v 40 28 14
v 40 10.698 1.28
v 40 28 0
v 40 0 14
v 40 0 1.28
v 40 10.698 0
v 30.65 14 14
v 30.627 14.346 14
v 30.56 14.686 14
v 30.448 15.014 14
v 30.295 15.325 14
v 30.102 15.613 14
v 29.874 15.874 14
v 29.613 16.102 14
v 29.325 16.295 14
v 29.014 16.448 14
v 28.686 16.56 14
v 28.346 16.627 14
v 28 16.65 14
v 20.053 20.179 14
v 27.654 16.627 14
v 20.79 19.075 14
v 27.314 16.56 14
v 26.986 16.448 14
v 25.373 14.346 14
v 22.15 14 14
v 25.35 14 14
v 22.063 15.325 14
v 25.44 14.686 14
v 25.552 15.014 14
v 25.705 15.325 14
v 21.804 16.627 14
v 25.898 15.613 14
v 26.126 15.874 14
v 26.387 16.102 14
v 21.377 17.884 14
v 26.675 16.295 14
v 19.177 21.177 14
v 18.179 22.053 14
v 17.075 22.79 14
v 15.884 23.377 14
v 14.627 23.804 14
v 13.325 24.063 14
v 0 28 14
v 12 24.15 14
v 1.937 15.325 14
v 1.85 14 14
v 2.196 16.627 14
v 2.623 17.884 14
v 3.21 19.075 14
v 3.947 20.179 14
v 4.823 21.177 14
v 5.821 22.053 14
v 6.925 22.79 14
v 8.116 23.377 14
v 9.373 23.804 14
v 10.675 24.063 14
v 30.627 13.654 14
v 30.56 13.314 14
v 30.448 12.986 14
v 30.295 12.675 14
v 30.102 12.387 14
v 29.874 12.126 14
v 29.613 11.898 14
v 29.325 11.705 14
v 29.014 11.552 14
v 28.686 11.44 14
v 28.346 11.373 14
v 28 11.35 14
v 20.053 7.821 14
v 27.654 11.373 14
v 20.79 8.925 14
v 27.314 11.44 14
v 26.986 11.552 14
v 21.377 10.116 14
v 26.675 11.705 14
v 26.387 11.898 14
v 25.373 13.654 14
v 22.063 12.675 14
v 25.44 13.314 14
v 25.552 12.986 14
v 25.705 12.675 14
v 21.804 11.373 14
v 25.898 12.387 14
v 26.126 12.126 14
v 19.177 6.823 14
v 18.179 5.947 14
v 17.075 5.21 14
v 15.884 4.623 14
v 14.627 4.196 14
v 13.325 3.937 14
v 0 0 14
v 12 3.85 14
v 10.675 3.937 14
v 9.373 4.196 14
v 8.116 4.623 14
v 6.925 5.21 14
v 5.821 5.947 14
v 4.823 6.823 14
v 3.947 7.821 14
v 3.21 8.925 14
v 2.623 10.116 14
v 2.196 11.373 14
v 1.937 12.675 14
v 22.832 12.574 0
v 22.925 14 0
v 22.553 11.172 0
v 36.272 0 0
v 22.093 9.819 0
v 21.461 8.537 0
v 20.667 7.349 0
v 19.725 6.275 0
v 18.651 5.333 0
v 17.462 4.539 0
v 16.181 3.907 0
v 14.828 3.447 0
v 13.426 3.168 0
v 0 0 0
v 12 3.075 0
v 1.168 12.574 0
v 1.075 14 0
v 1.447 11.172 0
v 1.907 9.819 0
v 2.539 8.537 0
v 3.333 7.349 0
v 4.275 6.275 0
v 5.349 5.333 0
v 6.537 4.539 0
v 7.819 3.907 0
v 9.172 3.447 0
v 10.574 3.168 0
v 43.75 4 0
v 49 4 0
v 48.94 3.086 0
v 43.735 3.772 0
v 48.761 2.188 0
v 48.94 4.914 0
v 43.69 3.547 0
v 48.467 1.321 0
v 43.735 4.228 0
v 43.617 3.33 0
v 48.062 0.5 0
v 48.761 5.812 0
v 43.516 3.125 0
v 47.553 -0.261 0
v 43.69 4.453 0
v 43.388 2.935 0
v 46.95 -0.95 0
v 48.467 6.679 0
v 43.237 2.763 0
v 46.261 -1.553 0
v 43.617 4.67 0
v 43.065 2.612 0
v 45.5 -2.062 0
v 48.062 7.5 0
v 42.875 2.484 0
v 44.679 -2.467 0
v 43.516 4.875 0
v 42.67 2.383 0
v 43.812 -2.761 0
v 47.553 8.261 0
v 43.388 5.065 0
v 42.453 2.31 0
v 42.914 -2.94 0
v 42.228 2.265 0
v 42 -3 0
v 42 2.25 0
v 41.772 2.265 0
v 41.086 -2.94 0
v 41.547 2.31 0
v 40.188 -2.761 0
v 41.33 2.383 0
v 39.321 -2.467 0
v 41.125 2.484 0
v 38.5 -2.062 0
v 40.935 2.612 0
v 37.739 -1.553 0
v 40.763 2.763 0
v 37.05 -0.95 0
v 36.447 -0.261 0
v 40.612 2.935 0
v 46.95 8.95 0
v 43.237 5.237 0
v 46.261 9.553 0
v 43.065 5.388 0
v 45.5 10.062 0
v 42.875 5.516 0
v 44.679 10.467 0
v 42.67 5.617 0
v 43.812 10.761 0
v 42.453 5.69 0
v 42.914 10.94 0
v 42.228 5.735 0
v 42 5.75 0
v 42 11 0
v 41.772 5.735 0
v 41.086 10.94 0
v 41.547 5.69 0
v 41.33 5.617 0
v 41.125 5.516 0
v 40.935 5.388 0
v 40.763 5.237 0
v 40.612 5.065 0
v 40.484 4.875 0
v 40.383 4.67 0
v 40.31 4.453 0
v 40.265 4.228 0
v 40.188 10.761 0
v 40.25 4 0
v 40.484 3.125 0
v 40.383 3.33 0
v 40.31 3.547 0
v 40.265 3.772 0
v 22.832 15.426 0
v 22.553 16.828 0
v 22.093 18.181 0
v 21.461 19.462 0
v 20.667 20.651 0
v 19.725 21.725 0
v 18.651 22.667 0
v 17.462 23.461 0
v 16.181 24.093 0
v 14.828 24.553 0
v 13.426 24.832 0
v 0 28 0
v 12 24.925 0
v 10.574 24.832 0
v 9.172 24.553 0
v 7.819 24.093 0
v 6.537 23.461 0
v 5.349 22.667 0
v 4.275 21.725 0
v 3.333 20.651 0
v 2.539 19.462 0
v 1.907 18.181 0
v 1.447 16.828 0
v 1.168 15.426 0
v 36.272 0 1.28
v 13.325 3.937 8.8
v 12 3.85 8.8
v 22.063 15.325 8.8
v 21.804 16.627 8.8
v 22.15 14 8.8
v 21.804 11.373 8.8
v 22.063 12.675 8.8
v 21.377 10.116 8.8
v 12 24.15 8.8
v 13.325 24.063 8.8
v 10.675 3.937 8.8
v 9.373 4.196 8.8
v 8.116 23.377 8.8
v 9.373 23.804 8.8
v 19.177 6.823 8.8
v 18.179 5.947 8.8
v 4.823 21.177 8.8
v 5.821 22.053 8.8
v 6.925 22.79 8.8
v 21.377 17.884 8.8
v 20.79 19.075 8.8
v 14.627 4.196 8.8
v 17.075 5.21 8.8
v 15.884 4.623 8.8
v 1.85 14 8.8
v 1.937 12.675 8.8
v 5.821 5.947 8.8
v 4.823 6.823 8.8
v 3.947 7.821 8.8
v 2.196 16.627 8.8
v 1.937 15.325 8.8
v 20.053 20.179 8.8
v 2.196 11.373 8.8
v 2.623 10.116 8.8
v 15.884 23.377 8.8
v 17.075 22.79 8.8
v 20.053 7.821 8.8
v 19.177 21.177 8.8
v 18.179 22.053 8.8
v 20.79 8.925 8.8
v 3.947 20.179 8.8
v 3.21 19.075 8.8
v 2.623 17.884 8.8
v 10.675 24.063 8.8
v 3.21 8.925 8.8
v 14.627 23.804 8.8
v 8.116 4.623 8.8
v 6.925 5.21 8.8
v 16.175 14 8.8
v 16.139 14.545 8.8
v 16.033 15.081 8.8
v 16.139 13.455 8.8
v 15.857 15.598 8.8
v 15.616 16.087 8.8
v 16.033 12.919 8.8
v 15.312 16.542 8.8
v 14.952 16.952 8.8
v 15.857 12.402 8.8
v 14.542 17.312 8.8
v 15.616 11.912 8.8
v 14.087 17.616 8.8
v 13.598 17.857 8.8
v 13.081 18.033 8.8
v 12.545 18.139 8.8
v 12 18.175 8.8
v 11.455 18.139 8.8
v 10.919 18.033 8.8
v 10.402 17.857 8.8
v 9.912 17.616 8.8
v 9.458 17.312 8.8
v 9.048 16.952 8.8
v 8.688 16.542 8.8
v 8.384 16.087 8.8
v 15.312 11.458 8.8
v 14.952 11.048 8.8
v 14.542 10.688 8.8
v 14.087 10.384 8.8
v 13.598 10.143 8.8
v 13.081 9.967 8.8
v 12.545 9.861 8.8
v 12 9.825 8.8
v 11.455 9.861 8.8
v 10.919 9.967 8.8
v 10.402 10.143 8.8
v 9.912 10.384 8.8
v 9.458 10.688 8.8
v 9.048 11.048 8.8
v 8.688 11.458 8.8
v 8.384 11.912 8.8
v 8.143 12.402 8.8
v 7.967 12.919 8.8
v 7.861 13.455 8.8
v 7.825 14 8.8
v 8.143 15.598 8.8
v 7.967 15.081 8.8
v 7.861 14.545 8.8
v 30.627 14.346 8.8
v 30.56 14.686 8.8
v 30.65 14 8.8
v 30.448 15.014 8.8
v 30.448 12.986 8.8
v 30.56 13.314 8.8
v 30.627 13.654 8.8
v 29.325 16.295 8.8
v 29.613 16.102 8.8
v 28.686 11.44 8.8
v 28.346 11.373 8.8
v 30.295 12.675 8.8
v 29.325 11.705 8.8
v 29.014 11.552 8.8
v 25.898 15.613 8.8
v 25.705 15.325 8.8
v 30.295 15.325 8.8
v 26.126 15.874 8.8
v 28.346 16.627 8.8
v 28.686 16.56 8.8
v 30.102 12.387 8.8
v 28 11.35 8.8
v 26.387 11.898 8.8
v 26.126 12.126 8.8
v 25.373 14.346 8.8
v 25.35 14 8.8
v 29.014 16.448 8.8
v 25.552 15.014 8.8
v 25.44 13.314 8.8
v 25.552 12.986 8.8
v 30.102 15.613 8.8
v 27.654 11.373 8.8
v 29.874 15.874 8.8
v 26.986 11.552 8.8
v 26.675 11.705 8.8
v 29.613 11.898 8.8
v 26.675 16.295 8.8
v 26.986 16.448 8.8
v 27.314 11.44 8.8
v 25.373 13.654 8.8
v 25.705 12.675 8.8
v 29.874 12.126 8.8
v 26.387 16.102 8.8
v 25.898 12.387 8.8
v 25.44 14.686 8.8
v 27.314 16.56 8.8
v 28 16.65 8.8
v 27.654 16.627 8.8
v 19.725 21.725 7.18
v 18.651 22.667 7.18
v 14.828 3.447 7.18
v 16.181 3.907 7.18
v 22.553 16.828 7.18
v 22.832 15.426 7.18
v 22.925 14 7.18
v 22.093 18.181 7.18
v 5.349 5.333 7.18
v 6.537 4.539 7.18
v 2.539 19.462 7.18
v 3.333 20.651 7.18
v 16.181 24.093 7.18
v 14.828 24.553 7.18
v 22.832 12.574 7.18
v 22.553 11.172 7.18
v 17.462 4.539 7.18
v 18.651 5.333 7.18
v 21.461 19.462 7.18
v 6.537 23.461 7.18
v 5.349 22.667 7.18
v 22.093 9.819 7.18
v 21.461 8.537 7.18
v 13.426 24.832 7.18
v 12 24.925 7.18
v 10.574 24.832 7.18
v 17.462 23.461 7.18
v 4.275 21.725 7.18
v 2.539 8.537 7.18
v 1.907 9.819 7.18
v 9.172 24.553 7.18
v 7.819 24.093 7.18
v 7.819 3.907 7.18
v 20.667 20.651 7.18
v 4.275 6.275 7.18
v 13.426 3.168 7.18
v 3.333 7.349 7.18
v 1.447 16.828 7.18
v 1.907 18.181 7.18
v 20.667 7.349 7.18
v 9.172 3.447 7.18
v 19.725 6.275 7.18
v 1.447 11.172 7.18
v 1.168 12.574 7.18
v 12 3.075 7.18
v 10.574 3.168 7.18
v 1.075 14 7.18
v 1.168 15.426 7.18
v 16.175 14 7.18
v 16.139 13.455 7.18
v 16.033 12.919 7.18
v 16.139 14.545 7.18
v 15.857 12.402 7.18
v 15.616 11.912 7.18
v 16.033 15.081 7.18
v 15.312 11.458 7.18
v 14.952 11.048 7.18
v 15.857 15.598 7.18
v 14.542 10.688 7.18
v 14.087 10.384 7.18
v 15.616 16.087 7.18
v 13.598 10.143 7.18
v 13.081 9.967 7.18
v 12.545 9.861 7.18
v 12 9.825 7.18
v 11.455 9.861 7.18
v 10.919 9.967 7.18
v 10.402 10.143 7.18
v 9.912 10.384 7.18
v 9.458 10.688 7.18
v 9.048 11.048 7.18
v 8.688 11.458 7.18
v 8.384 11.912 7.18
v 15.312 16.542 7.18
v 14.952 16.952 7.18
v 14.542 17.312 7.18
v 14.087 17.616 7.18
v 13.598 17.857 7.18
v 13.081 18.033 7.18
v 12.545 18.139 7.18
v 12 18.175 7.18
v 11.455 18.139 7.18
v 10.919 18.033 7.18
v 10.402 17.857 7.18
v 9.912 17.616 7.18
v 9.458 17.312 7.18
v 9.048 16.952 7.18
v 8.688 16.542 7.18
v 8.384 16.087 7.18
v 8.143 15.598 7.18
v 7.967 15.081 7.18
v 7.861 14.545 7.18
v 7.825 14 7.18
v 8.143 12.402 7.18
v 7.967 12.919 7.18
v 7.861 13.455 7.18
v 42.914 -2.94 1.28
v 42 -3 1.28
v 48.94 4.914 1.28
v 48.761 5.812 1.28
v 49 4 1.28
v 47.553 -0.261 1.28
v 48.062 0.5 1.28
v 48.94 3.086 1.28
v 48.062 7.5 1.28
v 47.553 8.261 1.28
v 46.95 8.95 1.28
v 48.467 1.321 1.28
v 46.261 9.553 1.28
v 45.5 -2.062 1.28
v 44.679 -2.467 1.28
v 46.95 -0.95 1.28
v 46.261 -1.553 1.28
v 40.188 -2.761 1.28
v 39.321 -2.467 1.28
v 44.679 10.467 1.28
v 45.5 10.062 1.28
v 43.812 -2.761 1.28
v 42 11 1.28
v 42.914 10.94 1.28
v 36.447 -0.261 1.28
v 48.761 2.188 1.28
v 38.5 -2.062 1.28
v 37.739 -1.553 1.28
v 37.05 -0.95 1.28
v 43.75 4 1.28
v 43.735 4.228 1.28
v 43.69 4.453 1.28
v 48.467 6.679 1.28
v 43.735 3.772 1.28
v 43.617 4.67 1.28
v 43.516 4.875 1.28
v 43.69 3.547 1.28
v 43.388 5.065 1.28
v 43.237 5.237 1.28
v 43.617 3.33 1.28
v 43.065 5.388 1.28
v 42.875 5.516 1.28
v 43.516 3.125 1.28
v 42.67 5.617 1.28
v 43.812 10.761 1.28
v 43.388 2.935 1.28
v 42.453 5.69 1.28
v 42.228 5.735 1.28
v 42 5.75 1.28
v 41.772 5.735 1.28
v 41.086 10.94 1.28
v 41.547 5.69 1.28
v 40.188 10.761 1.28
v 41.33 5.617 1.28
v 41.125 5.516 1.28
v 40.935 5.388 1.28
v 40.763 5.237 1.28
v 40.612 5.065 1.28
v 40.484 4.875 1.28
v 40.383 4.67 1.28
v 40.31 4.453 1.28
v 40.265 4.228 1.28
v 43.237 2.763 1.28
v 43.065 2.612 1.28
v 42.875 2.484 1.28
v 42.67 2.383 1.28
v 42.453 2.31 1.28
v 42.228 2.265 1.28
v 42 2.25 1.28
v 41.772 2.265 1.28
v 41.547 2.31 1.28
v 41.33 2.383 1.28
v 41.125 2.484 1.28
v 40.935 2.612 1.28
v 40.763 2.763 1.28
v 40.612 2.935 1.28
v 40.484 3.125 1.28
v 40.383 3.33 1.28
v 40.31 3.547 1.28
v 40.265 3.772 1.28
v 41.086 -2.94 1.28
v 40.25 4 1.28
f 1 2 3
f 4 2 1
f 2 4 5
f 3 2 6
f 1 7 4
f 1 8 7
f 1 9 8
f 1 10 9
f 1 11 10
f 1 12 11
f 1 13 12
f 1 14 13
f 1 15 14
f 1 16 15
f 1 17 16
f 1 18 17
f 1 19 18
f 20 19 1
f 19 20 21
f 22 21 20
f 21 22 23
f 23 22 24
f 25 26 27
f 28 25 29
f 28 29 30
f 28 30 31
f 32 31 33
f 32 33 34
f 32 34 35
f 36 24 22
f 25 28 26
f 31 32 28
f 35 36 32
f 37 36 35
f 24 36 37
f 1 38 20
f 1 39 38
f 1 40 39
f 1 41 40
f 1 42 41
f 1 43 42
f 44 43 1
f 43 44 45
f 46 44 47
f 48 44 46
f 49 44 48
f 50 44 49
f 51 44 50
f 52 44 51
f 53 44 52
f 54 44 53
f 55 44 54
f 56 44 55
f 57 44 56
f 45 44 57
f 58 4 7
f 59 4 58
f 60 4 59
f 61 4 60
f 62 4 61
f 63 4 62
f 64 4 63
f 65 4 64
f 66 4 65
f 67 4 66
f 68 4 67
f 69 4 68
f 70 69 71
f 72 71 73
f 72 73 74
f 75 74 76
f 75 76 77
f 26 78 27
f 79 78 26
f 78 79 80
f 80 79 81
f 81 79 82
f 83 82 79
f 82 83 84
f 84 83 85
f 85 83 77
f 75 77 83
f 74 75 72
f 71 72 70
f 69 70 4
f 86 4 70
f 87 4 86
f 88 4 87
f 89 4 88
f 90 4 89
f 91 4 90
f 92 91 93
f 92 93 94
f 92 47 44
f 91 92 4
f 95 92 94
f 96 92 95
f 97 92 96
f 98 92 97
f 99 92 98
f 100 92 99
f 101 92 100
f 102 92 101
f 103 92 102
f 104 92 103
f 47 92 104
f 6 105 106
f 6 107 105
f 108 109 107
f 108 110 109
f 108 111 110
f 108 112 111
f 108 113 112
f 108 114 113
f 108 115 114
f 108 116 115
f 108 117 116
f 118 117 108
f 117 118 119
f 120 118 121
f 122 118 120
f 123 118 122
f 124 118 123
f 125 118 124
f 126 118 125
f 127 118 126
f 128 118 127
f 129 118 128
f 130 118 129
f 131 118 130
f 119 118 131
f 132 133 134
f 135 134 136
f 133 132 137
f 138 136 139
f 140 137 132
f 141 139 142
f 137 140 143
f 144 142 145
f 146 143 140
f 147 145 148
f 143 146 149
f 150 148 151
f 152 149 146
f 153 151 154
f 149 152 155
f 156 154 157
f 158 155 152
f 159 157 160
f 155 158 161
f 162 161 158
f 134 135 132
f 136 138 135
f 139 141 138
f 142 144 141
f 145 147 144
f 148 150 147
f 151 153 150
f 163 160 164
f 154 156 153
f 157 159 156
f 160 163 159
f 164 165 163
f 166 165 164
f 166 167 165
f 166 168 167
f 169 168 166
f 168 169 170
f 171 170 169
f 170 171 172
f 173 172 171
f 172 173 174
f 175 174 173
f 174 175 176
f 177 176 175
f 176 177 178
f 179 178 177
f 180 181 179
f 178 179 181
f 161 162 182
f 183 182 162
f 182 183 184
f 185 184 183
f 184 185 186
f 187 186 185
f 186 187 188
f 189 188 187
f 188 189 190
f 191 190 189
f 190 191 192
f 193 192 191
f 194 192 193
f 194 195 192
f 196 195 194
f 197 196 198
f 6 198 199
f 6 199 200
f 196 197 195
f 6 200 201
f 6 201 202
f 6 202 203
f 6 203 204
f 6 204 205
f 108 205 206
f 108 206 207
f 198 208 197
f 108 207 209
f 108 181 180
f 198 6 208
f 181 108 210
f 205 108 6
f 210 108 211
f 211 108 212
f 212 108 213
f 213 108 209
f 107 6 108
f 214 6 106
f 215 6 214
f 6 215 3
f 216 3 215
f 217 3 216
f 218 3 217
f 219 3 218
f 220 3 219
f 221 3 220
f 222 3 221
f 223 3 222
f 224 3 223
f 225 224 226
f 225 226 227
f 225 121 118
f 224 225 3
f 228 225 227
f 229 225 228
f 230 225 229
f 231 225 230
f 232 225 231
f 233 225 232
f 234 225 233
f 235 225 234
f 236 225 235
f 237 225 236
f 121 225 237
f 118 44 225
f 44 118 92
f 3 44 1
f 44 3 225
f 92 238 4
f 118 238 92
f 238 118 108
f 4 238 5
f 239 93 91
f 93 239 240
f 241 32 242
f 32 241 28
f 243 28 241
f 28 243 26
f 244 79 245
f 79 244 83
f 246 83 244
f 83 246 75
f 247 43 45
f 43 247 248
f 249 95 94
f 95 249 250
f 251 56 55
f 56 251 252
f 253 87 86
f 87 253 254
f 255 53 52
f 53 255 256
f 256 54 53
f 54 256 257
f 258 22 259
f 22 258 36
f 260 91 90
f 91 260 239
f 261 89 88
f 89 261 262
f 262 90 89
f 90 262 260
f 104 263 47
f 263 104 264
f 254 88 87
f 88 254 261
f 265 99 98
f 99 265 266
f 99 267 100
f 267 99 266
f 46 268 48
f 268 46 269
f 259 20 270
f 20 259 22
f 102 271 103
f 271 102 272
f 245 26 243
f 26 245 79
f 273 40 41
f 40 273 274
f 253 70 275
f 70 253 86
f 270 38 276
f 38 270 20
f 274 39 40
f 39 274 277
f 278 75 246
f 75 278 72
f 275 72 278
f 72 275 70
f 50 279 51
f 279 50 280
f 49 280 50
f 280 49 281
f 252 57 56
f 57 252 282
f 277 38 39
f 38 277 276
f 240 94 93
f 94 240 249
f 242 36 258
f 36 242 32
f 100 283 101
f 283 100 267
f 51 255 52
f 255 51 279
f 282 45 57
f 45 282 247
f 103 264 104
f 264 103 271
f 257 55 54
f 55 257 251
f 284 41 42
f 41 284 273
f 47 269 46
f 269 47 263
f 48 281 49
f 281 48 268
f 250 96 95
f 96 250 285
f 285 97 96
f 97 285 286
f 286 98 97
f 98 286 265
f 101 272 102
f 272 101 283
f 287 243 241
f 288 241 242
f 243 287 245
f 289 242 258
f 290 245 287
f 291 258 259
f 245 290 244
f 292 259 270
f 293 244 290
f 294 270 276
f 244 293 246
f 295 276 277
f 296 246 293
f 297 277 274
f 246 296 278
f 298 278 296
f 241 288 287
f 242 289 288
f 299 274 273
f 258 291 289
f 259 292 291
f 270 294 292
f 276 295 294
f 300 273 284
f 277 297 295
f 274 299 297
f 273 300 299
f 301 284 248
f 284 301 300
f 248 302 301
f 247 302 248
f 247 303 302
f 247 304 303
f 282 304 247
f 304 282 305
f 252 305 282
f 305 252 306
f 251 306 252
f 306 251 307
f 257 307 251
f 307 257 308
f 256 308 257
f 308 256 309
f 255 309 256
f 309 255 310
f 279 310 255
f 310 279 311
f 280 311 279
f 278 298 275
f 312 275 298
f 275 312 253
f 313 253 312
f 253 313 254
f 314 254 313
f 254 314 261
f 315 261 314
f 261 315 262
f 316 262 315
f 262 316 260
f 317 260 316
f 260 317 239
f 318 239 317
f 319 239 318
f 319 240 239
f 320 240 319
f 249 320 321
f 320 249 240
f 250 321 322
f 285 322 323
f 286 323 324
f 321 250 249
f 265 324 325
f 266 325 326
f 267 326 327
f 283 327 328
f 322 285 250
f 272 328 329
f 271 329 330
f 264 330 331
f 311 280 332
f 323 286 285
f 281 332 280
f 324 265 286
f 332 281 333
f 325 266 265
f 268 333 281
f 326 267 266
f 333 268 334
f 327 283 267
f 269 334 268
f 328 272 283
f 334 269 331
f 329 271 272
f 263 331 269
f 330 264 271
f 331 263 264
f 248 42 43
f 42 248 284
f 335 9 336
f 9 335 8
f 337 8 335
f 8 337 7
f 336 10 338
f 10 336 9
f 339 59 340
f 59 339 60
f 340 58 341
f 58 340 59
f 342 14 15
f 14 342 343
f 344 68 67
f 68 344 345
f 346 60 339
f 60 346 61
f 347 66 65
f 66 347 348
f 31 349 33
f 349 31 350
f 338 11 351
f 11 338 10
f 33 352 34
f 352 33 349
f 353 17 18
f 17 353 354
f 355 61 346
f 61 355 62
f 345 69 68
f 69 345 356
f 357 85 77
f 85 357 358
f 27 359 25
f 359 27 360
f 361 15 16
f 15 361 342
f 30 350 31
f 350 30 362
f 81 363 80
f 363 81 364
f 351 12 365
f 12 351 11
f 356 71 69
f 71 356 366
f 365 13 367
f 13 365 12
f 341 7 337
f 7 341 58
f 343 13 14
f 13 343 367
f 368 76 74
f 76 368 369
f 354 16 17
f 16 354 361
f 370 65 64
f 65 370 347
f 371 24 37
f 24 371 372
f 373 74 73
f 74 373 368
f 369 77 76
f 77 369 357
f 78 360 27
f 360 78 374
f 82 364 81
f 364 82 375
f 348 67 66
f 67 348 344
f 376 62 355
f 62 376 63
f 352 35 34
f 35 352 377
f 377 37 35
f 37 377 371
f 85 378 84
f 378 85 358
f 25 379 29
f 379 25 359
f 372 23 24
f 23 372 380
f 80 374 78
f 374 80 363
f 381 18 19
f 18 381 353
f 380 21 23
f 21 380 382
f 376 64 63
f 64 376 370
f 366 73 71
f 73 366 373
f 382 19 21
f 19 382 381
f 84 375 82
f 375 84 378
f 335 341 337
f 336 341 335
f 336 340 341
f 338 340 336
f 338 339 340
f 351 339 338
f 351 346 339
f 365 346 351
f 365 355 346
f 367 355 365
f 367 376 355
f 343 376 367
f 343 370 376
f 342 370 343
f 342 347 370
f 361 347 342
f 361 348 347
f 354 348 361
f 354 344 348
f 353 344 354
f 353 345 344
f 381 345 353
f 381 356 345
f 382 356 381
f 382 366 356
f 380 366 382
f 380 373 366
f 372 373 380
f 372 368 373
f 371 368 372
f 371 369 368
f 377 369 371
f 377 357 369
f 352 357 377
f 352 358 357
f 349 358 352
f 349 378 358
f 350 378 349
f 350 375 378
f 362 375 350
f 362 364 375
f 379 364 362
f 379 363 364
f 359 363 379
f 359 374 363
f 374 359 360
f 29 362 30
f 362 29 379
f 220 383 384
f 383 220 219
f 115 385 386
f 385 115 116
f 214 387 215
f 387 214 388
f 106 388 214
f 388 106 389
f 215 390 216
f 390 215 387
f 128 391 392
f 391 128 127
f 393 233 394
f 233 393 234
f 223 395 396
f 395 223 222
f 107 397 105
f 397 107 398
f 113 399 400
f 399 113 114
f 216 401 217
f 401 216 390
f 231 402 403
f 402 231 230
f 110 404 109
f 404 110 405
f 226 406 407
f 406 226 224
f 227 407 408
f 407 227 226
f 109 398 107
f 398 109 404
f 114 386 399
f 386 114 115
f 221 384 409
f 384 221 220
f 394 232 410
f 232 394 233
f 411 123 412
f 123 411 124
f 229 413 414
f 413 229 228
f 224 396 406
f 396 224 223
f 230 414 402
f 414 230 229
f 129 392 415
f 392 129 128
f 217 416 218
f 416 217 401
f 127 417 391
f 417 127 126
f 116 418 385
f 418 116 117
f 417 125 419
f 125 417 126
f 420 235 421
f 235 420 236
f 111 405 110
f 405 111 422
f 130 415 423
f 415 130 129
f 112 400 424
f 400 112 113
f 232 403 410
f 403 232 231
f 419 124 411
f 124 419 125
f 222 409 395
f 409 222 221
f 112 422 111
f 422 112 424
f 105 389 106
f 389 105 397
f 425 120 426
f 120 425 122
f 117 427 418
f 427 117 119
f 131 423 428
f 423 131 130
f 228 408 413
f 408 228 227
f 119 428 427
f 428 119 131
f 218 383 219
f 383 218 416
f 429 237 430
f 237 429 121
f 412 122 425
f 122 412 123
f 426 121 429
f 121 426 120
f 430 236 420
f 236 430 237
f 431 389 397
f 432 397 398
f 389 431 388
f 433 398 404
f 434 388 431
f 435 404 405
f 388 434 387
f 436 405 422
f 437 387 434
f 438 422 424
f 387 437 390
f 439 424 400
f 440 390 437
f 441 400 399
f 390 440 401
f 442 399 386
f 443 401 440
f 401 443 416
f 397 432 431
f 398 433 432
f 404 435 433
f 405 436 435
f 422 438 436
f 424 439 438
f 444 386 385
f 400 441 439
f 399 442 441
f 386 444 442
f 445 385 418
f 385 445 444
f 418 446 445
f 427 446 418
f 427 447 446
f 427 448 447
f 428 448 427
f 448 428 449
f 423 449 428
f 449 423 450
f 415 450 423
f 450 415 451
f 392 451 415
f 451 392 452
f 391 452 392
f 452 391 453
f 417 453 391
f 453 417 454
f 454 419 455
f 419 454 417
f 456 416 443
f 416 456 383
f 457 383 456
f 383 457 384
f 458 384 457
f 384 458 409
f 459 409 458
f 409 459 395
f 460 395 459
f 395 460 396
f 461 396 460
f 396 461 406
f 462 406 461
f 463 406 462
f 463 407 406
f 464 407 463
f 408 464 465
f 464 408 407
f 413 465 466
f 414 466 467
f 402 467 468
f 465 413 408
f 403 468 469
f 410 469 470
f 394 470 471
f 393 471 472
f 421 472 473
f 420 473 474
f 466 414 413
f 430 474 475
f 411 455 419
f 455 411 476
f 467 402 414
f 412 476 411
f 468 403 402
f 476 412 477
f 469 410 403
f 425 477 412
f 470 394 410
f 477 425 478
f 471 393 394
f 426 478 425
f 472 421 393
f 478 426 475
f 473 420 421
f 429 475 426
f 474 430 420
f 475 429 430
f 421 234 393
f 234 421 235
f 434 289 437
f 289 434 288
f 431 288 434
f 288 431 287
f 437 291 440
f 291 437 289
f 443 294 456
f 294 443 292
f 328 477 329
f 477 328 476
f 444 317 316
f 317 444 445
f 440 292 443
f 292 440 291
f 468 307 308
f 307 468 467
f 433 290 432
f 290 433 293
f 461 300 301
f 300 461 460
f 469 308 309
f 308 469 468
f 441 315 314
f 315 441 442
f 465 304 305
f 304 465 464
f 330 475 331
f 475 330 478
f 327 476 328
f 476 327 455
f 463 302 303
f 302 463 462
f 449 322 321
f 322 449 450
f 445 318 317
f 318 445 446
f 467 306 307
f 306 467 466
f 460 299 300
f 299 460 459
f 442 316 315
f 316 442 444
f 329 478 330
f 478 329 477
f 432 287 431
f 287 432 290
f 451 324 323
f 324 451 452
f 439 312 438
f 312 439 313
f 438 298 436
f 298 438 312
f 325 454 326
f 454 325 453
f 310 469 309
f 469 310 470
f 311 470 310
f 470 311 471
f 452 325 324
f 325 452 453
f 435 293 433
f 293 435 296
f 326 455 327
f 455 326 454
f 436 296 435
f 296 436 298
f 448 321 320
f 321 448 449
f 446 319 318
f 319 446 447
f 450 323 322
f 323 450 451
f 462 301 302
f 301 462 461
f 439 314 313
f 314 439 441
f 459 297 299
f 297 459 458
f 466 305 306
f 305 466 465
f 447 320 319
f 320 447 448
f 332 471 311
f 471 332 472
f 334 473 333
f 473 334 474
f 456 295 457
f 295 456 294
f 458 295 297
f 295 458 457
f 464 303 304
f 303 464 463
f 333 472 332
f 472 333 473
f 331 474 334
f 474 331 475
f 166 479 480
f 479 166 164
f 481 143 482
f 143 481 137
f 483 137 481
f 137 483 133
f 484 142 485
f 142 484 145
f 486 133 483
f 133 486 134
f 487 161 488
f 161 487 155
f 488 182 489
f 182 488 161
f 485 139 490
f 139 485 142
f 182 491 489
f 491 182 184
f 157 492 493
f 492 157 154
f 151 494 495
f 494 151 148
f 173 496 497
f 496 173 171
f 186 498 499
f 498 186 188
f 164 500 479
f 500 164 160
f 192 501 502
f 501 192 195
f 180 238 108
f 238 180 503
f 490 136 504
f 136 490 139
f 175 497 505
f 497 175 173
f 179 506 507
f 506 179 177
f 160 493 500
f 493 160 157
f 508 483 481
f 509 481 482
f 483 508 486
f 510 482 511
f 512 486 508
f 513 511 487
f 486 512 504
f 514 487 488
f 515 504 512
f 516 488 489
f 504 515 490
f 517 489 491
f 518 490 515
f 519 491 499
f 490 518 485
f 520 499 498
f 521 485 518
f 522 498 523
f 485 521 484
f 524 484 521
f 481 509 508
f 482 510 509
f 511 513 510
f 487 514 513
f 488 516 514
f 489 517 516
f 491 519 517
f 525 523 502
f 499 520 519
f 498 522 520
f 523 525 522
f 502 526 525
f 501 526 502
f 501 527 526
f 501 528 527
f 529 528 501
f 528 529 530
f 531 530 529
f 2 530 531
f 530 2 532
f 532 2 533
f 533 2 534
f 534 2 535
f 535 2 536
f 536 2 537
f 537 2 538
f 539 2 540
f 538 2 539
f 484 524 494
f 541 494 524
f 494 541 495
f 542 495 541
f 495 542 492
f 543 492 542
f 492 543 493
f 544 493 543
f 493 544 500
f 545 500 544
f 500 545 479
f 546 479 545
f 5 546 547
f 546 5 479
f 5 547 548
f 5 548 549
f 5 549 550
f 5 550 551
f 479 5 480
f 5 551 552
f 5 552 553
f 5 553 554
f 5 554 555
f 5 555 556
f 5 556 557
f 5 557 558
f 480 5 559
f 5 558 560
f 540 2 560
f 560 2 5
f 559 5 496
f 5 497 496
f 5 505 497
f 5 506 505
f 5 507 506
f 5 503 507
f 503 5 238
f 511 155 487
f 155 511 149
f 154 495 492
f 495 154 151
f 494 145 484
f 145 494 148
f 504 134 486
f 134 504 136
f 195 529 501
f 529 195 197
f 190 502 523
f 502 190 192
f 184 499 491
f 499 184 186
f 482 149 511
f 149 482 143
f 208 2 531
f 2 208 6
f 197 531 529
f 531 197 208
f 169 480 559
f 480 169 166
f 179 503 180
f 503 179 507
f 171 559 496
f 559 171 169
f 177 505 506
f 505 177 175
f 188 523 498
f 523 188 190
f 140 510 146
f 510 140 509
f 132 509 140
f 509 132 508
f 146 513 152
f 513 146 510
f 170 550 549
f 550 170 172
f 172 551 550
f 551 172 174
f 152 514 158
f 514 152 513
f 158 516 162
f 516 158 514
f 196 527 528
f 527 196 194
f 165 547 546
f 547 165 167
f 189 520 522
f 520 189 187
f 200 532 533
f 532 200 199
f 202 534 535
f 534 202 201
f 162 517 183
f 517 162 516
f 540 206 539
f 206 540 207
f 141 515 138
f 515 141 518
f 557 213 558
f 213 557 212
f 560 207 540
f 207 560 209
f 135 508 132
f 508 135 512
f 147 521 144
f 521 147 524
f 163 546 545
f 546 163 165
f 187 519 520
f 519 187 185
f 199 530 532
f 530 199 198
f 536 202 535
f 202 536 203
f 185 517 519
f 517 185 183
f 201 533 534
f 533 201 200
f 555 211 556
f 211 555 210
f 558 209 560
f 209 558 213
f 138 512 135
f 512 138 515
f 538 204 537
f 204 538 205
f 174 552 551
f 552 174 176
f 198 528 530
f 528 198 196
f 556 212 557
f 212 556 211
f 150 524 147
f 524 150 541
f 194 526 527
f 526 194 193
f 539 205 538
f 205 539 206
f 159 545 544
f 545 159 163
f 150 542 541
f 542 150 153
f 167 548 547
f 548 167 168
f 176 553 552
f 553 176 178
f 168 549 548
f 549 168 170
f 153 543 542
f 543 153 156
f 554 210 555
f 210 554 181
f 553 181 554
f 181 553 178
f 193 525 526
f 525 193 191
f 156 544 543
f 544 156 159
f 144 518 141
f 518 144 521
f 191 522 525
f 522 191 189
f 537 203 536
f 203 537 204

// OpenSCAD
// file: parameters.scad
// =============================================================================
// Gen-Y Dual-rotor MICRO-GAP copper-window AFPM — WOUND-AWARE (HARD GATE)
// PRIMARY challenger vs Gen-V. Thinner m2m + larger copper window + 150 t.
// =============================================================================

// --- Wire / wind budget (26 AWG, ~1 lb spool ≈ 390 m bare-equiv) --------------
wire_awg            = 26;
wire_od             = 0.45;     // insulated OD mm
turns               = 150;      // +10 vs Gen-V
fill                = 0.70;
layers_per_face     = 2;        // axial layers proud of EACH flange
wind_build_axial    = layers_per_face * wire_od * fill;   // 0.63 mm
wind_build_radial   = 3 * wire_od * fill;                 // 0.945 mm

// --- Pancake former (bare STL) — thinner web/flange than Gen-V ---------------
coil_id_r           = 21.0;     // larger copper window vs Gen-V 23–58
coil_od_r           = 60.0;
span_deg            = 26.0;     // 12 stations × 30° pitch
former_web          = 1.8;
flange_t            = 0.70;
wall                = 1.2;
slot_w              = 2.4;
mount_hole          = 3.5;
tab_len             = 7.0;

former_bare_h       = former_web + 2 * flange_t;            // 3.2 mm
coil_envelope_h     = former_bare_h + 2 * wind_build_axial; // 4.46 mm

// --- Running clearance (magnet face → WOUND face) EACH side ------------------
run_clear           = 0.65;     // PASS ≥ 0.5 (prefer ≥0.65)
gap_spacer_h        = run_clear + wind_build_axial;         // 1.28 mm
m2m                 = coil_envelope_h + 2 * run_clear;      // 5.76 mm (beats Gen-V 6.16)

// --- Mid stator (12 pancakes 3φ; winds proud both faces) ---------------------
coil_stations       = 12;
bay_r_in            = coil_id_r - 2.0 - wind_build_radial;
bay_r_out           = coil_od_r + 2.0 + wind_build_radial;
bay_span            = span_deg + 4.0;
bay_offset          = 2.0;
stator_thick        = former_bare_h;                        // winds proud ±Z
stator_od           = 156.0;
shaft_clear_stator  = 36.0;
coil_mount_r        = 28.0;

// --- Rotors (×2) — 8×Ø20 + 24×Ø5 Halbach each face ---------------------------
large_pocket_d      = 20.3;
small_pocket_d      = 5.3;
pocket_h            = 5.2;
large_n             = 8;
R_large             = 52.0;
R_small_inner       = 40.0;
R_small_mid         = 52.0;
R_small_outer       = 64.0;
carrier_od          = 152.0;
carrier_thick       = 7.5;
hub_h               = 10.0;
hub_od              = 30.0;
rotor_b_offset_deg  = 22.5;

// --- Modular MAX interface (Gen-E family) ------------------------------------
shaft_bore          = 8.35;
bearing_d           = 21.85;
bearing_h           = 7.2;
m3_clear            = 3.5;
bolt_r_inner        = 36.0;
bolt_n_inner        = 6;
flange_bolt_r       = 72.0;
flange_bolt_n       = 6;
brace_r             = 68.0;
brace_d             = 4.3;
brace_n             = 4;

spacer_pad_od       = 14.0;
spacer_pad_id       = m3_clear;
endbell_od          = 156.0;
endbell_thick       = 8.0;
endbell_shaft_clear = 10.0;

$fn = 64;
// main file
// Gen-Y fit coupon — magnet pockets + 608 + spacer height
include <parameters.scad>;
$fn = 48;
block_w = 40; block_d = 28; block_h = 14;
difference() {
    cube([block_w, block_d, block_h]);
    translate([12, block_d/2, block_h - pocket_h])
        cylinder(d=large_pocket_d, h=pocket_h + 0.2);
    translate([28, block_d/2, block_h - pocket_h])
        cylinder(d=small_pocket_d, h=pocket_h + 0.2);
    translate([12, block_d/2, -0.02])
        cylinder(d=bearing_d, h=bearing_h);
    translate([12, block_d/2, -0.1])
        cylinder(d=shaft_bore, h=block_h + 1);
}
translate([block_w + 2, 4, 0])
    difference() {
        cylinder(d=spacer_pad_od, h=gap_spacer_h);
        translate([0, 0, -0.1]) cylinder(d=spacer_pad_id, h=gap_spacer_h + 0.2);
    }
